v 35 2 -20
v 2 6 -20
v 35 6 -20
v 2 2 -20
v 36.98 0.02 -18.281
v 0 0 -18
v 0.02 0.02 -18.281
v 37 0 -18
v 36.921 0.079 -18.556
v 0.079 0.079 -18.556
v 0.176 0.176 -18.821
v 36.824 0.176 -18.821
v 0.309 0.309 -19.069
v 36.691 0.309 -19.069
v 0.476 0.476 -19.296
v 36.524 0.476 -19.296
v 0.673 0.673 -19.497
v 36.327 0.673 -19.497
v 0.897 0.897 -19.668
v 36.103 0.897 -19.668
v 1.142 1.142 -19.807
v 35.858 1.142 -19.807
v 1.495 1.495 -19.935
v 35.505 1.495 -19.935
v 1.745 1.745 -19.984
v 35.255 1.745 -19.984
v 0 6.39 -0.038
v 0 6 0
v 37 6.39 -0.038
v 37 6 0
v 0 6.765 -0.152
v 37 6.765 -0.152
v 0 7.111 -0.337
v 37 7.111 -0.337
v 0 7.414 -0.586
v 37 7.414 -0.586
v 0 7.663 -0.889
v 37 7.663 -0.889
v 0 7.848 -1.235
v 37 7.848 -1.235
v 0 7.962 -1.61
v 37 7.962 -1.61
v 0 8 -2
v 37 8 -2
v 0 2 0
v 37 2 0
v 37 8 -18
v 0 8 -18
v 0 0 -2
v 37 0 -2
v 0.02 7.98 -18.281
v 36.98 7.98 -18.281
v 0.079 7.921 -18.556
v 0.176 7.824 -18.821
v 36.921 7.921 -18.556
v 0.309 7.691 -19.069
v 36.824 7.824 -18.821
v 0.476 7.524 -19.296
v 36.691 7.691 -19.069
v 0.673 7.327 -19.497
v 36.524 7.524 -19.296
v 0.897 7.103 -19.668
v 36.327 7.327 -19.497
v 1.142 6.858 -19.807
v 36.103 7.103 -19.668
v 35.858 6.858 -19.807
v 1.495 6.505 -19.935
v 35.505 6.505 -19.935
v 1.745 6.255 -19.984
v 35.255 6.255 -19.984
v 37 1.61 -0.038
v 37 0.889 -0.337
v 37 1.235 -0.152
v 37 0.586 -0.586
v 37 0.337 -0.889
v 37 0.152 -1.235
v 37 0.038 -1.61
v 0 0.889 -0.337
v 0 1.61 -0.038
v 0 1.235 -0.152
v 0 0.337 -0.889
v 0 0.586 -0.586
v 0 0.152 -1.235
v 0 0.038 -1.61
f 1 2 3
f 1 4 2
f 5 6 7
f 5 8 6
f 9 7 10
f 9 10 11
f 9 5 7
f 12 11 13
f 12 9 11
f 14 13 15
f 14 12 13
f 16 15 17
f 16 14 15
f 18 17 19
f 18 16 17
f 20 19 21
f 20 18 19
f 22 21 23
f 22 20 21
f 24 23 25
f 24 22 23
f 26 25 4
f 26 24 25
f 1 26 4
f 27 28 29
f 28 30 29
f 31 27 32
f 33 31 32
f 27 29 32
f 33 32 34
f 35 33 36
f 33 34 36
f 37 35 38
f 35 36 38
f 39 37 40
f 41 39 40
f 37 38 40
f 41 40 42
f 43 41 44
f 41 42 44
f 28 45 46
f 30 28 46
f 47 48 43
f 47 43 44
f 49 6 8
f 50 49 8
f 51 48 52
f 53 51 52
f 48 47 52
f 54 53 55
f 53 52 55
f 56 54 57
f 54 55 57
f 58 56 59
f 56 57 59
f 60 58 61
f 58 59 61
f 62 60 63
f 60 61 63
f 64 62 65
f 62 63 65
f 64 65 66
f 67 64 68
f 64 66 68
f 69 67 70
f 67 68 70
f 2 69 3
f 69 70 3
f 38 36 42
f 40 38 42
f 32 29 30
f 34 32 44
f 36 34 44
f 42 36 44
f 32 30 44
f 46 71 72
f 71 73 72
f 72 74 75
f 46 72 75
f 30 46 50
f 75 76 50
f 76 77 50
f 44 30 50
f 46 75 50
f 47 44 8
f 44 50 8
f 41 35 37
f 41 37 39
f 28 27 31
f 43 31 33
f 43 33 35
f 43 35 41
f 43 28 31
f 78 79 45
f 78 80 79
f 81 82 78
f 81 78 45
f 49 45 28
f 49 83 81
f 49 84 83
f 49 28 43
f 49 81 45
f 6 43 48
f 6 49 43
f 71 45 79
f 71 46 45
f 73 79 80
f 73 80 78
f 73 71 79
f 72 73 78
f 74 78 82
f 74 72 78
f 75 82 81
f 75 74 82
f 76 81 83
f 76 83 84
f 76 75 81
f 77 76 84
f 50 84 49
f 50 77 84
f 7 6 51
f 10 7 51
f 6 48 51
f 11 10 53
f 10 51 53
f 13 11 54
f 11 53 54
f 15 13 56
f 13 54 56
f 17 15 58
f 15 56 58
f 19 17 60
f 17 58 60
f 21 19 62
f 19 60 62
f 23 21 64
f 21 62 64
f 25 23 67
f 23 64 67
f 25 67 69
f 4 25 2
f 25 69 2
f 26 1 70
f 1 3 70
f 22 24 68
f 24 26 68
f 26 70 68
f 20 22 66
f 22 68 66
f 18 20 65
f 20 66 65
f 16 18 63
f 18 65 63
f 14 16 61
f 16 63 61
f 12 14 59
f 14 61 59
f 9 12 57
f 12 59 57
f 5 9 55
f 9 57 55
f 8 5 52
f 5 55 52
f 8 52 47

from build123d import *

# Parameters (mm, degrees)
SKETCH1_W           = 37
SKETCH1_H           = 20
BOSS_EXTRUDE1_DEPTH = 8
FILLET1_R           = 2
FILLET2_R           = 2


with BuildPart() as part:
    # Sketch1 → Boss-Extrude1 (new body)
    with BuildSketch(Plane(origin=(0, 0, 0), x_dir=(1, 0, 0), z_dir=(0, 1, 0))):
        with Locations((18.5, 10)):
            Rectangle(SKETCH1_W, SKETCH1_H)
    extrude(amount=BOSS_EXTRUDE1_DEPTH)

    # Fillet1
    fillet1_edges = [part.edges().sort_by_distance(p)[0] for p in [
        (18.5, 8, 0),
    ]]
    fillet(fillet1_edges, radius=FILLET1_R)

    # Fillet2
    fillet2_edges = [part.edges().sort_by_distance(p)[0] for p in [
        (18.5, 8, -20),
        (18.5, 0, -20),
        (18.5, 0, 0),
        (0, 4, -20),
        (37, 4, -20),
    ]]
    fillet(fillet2_edges, radius=FILLET2_R)


solid = part.part
